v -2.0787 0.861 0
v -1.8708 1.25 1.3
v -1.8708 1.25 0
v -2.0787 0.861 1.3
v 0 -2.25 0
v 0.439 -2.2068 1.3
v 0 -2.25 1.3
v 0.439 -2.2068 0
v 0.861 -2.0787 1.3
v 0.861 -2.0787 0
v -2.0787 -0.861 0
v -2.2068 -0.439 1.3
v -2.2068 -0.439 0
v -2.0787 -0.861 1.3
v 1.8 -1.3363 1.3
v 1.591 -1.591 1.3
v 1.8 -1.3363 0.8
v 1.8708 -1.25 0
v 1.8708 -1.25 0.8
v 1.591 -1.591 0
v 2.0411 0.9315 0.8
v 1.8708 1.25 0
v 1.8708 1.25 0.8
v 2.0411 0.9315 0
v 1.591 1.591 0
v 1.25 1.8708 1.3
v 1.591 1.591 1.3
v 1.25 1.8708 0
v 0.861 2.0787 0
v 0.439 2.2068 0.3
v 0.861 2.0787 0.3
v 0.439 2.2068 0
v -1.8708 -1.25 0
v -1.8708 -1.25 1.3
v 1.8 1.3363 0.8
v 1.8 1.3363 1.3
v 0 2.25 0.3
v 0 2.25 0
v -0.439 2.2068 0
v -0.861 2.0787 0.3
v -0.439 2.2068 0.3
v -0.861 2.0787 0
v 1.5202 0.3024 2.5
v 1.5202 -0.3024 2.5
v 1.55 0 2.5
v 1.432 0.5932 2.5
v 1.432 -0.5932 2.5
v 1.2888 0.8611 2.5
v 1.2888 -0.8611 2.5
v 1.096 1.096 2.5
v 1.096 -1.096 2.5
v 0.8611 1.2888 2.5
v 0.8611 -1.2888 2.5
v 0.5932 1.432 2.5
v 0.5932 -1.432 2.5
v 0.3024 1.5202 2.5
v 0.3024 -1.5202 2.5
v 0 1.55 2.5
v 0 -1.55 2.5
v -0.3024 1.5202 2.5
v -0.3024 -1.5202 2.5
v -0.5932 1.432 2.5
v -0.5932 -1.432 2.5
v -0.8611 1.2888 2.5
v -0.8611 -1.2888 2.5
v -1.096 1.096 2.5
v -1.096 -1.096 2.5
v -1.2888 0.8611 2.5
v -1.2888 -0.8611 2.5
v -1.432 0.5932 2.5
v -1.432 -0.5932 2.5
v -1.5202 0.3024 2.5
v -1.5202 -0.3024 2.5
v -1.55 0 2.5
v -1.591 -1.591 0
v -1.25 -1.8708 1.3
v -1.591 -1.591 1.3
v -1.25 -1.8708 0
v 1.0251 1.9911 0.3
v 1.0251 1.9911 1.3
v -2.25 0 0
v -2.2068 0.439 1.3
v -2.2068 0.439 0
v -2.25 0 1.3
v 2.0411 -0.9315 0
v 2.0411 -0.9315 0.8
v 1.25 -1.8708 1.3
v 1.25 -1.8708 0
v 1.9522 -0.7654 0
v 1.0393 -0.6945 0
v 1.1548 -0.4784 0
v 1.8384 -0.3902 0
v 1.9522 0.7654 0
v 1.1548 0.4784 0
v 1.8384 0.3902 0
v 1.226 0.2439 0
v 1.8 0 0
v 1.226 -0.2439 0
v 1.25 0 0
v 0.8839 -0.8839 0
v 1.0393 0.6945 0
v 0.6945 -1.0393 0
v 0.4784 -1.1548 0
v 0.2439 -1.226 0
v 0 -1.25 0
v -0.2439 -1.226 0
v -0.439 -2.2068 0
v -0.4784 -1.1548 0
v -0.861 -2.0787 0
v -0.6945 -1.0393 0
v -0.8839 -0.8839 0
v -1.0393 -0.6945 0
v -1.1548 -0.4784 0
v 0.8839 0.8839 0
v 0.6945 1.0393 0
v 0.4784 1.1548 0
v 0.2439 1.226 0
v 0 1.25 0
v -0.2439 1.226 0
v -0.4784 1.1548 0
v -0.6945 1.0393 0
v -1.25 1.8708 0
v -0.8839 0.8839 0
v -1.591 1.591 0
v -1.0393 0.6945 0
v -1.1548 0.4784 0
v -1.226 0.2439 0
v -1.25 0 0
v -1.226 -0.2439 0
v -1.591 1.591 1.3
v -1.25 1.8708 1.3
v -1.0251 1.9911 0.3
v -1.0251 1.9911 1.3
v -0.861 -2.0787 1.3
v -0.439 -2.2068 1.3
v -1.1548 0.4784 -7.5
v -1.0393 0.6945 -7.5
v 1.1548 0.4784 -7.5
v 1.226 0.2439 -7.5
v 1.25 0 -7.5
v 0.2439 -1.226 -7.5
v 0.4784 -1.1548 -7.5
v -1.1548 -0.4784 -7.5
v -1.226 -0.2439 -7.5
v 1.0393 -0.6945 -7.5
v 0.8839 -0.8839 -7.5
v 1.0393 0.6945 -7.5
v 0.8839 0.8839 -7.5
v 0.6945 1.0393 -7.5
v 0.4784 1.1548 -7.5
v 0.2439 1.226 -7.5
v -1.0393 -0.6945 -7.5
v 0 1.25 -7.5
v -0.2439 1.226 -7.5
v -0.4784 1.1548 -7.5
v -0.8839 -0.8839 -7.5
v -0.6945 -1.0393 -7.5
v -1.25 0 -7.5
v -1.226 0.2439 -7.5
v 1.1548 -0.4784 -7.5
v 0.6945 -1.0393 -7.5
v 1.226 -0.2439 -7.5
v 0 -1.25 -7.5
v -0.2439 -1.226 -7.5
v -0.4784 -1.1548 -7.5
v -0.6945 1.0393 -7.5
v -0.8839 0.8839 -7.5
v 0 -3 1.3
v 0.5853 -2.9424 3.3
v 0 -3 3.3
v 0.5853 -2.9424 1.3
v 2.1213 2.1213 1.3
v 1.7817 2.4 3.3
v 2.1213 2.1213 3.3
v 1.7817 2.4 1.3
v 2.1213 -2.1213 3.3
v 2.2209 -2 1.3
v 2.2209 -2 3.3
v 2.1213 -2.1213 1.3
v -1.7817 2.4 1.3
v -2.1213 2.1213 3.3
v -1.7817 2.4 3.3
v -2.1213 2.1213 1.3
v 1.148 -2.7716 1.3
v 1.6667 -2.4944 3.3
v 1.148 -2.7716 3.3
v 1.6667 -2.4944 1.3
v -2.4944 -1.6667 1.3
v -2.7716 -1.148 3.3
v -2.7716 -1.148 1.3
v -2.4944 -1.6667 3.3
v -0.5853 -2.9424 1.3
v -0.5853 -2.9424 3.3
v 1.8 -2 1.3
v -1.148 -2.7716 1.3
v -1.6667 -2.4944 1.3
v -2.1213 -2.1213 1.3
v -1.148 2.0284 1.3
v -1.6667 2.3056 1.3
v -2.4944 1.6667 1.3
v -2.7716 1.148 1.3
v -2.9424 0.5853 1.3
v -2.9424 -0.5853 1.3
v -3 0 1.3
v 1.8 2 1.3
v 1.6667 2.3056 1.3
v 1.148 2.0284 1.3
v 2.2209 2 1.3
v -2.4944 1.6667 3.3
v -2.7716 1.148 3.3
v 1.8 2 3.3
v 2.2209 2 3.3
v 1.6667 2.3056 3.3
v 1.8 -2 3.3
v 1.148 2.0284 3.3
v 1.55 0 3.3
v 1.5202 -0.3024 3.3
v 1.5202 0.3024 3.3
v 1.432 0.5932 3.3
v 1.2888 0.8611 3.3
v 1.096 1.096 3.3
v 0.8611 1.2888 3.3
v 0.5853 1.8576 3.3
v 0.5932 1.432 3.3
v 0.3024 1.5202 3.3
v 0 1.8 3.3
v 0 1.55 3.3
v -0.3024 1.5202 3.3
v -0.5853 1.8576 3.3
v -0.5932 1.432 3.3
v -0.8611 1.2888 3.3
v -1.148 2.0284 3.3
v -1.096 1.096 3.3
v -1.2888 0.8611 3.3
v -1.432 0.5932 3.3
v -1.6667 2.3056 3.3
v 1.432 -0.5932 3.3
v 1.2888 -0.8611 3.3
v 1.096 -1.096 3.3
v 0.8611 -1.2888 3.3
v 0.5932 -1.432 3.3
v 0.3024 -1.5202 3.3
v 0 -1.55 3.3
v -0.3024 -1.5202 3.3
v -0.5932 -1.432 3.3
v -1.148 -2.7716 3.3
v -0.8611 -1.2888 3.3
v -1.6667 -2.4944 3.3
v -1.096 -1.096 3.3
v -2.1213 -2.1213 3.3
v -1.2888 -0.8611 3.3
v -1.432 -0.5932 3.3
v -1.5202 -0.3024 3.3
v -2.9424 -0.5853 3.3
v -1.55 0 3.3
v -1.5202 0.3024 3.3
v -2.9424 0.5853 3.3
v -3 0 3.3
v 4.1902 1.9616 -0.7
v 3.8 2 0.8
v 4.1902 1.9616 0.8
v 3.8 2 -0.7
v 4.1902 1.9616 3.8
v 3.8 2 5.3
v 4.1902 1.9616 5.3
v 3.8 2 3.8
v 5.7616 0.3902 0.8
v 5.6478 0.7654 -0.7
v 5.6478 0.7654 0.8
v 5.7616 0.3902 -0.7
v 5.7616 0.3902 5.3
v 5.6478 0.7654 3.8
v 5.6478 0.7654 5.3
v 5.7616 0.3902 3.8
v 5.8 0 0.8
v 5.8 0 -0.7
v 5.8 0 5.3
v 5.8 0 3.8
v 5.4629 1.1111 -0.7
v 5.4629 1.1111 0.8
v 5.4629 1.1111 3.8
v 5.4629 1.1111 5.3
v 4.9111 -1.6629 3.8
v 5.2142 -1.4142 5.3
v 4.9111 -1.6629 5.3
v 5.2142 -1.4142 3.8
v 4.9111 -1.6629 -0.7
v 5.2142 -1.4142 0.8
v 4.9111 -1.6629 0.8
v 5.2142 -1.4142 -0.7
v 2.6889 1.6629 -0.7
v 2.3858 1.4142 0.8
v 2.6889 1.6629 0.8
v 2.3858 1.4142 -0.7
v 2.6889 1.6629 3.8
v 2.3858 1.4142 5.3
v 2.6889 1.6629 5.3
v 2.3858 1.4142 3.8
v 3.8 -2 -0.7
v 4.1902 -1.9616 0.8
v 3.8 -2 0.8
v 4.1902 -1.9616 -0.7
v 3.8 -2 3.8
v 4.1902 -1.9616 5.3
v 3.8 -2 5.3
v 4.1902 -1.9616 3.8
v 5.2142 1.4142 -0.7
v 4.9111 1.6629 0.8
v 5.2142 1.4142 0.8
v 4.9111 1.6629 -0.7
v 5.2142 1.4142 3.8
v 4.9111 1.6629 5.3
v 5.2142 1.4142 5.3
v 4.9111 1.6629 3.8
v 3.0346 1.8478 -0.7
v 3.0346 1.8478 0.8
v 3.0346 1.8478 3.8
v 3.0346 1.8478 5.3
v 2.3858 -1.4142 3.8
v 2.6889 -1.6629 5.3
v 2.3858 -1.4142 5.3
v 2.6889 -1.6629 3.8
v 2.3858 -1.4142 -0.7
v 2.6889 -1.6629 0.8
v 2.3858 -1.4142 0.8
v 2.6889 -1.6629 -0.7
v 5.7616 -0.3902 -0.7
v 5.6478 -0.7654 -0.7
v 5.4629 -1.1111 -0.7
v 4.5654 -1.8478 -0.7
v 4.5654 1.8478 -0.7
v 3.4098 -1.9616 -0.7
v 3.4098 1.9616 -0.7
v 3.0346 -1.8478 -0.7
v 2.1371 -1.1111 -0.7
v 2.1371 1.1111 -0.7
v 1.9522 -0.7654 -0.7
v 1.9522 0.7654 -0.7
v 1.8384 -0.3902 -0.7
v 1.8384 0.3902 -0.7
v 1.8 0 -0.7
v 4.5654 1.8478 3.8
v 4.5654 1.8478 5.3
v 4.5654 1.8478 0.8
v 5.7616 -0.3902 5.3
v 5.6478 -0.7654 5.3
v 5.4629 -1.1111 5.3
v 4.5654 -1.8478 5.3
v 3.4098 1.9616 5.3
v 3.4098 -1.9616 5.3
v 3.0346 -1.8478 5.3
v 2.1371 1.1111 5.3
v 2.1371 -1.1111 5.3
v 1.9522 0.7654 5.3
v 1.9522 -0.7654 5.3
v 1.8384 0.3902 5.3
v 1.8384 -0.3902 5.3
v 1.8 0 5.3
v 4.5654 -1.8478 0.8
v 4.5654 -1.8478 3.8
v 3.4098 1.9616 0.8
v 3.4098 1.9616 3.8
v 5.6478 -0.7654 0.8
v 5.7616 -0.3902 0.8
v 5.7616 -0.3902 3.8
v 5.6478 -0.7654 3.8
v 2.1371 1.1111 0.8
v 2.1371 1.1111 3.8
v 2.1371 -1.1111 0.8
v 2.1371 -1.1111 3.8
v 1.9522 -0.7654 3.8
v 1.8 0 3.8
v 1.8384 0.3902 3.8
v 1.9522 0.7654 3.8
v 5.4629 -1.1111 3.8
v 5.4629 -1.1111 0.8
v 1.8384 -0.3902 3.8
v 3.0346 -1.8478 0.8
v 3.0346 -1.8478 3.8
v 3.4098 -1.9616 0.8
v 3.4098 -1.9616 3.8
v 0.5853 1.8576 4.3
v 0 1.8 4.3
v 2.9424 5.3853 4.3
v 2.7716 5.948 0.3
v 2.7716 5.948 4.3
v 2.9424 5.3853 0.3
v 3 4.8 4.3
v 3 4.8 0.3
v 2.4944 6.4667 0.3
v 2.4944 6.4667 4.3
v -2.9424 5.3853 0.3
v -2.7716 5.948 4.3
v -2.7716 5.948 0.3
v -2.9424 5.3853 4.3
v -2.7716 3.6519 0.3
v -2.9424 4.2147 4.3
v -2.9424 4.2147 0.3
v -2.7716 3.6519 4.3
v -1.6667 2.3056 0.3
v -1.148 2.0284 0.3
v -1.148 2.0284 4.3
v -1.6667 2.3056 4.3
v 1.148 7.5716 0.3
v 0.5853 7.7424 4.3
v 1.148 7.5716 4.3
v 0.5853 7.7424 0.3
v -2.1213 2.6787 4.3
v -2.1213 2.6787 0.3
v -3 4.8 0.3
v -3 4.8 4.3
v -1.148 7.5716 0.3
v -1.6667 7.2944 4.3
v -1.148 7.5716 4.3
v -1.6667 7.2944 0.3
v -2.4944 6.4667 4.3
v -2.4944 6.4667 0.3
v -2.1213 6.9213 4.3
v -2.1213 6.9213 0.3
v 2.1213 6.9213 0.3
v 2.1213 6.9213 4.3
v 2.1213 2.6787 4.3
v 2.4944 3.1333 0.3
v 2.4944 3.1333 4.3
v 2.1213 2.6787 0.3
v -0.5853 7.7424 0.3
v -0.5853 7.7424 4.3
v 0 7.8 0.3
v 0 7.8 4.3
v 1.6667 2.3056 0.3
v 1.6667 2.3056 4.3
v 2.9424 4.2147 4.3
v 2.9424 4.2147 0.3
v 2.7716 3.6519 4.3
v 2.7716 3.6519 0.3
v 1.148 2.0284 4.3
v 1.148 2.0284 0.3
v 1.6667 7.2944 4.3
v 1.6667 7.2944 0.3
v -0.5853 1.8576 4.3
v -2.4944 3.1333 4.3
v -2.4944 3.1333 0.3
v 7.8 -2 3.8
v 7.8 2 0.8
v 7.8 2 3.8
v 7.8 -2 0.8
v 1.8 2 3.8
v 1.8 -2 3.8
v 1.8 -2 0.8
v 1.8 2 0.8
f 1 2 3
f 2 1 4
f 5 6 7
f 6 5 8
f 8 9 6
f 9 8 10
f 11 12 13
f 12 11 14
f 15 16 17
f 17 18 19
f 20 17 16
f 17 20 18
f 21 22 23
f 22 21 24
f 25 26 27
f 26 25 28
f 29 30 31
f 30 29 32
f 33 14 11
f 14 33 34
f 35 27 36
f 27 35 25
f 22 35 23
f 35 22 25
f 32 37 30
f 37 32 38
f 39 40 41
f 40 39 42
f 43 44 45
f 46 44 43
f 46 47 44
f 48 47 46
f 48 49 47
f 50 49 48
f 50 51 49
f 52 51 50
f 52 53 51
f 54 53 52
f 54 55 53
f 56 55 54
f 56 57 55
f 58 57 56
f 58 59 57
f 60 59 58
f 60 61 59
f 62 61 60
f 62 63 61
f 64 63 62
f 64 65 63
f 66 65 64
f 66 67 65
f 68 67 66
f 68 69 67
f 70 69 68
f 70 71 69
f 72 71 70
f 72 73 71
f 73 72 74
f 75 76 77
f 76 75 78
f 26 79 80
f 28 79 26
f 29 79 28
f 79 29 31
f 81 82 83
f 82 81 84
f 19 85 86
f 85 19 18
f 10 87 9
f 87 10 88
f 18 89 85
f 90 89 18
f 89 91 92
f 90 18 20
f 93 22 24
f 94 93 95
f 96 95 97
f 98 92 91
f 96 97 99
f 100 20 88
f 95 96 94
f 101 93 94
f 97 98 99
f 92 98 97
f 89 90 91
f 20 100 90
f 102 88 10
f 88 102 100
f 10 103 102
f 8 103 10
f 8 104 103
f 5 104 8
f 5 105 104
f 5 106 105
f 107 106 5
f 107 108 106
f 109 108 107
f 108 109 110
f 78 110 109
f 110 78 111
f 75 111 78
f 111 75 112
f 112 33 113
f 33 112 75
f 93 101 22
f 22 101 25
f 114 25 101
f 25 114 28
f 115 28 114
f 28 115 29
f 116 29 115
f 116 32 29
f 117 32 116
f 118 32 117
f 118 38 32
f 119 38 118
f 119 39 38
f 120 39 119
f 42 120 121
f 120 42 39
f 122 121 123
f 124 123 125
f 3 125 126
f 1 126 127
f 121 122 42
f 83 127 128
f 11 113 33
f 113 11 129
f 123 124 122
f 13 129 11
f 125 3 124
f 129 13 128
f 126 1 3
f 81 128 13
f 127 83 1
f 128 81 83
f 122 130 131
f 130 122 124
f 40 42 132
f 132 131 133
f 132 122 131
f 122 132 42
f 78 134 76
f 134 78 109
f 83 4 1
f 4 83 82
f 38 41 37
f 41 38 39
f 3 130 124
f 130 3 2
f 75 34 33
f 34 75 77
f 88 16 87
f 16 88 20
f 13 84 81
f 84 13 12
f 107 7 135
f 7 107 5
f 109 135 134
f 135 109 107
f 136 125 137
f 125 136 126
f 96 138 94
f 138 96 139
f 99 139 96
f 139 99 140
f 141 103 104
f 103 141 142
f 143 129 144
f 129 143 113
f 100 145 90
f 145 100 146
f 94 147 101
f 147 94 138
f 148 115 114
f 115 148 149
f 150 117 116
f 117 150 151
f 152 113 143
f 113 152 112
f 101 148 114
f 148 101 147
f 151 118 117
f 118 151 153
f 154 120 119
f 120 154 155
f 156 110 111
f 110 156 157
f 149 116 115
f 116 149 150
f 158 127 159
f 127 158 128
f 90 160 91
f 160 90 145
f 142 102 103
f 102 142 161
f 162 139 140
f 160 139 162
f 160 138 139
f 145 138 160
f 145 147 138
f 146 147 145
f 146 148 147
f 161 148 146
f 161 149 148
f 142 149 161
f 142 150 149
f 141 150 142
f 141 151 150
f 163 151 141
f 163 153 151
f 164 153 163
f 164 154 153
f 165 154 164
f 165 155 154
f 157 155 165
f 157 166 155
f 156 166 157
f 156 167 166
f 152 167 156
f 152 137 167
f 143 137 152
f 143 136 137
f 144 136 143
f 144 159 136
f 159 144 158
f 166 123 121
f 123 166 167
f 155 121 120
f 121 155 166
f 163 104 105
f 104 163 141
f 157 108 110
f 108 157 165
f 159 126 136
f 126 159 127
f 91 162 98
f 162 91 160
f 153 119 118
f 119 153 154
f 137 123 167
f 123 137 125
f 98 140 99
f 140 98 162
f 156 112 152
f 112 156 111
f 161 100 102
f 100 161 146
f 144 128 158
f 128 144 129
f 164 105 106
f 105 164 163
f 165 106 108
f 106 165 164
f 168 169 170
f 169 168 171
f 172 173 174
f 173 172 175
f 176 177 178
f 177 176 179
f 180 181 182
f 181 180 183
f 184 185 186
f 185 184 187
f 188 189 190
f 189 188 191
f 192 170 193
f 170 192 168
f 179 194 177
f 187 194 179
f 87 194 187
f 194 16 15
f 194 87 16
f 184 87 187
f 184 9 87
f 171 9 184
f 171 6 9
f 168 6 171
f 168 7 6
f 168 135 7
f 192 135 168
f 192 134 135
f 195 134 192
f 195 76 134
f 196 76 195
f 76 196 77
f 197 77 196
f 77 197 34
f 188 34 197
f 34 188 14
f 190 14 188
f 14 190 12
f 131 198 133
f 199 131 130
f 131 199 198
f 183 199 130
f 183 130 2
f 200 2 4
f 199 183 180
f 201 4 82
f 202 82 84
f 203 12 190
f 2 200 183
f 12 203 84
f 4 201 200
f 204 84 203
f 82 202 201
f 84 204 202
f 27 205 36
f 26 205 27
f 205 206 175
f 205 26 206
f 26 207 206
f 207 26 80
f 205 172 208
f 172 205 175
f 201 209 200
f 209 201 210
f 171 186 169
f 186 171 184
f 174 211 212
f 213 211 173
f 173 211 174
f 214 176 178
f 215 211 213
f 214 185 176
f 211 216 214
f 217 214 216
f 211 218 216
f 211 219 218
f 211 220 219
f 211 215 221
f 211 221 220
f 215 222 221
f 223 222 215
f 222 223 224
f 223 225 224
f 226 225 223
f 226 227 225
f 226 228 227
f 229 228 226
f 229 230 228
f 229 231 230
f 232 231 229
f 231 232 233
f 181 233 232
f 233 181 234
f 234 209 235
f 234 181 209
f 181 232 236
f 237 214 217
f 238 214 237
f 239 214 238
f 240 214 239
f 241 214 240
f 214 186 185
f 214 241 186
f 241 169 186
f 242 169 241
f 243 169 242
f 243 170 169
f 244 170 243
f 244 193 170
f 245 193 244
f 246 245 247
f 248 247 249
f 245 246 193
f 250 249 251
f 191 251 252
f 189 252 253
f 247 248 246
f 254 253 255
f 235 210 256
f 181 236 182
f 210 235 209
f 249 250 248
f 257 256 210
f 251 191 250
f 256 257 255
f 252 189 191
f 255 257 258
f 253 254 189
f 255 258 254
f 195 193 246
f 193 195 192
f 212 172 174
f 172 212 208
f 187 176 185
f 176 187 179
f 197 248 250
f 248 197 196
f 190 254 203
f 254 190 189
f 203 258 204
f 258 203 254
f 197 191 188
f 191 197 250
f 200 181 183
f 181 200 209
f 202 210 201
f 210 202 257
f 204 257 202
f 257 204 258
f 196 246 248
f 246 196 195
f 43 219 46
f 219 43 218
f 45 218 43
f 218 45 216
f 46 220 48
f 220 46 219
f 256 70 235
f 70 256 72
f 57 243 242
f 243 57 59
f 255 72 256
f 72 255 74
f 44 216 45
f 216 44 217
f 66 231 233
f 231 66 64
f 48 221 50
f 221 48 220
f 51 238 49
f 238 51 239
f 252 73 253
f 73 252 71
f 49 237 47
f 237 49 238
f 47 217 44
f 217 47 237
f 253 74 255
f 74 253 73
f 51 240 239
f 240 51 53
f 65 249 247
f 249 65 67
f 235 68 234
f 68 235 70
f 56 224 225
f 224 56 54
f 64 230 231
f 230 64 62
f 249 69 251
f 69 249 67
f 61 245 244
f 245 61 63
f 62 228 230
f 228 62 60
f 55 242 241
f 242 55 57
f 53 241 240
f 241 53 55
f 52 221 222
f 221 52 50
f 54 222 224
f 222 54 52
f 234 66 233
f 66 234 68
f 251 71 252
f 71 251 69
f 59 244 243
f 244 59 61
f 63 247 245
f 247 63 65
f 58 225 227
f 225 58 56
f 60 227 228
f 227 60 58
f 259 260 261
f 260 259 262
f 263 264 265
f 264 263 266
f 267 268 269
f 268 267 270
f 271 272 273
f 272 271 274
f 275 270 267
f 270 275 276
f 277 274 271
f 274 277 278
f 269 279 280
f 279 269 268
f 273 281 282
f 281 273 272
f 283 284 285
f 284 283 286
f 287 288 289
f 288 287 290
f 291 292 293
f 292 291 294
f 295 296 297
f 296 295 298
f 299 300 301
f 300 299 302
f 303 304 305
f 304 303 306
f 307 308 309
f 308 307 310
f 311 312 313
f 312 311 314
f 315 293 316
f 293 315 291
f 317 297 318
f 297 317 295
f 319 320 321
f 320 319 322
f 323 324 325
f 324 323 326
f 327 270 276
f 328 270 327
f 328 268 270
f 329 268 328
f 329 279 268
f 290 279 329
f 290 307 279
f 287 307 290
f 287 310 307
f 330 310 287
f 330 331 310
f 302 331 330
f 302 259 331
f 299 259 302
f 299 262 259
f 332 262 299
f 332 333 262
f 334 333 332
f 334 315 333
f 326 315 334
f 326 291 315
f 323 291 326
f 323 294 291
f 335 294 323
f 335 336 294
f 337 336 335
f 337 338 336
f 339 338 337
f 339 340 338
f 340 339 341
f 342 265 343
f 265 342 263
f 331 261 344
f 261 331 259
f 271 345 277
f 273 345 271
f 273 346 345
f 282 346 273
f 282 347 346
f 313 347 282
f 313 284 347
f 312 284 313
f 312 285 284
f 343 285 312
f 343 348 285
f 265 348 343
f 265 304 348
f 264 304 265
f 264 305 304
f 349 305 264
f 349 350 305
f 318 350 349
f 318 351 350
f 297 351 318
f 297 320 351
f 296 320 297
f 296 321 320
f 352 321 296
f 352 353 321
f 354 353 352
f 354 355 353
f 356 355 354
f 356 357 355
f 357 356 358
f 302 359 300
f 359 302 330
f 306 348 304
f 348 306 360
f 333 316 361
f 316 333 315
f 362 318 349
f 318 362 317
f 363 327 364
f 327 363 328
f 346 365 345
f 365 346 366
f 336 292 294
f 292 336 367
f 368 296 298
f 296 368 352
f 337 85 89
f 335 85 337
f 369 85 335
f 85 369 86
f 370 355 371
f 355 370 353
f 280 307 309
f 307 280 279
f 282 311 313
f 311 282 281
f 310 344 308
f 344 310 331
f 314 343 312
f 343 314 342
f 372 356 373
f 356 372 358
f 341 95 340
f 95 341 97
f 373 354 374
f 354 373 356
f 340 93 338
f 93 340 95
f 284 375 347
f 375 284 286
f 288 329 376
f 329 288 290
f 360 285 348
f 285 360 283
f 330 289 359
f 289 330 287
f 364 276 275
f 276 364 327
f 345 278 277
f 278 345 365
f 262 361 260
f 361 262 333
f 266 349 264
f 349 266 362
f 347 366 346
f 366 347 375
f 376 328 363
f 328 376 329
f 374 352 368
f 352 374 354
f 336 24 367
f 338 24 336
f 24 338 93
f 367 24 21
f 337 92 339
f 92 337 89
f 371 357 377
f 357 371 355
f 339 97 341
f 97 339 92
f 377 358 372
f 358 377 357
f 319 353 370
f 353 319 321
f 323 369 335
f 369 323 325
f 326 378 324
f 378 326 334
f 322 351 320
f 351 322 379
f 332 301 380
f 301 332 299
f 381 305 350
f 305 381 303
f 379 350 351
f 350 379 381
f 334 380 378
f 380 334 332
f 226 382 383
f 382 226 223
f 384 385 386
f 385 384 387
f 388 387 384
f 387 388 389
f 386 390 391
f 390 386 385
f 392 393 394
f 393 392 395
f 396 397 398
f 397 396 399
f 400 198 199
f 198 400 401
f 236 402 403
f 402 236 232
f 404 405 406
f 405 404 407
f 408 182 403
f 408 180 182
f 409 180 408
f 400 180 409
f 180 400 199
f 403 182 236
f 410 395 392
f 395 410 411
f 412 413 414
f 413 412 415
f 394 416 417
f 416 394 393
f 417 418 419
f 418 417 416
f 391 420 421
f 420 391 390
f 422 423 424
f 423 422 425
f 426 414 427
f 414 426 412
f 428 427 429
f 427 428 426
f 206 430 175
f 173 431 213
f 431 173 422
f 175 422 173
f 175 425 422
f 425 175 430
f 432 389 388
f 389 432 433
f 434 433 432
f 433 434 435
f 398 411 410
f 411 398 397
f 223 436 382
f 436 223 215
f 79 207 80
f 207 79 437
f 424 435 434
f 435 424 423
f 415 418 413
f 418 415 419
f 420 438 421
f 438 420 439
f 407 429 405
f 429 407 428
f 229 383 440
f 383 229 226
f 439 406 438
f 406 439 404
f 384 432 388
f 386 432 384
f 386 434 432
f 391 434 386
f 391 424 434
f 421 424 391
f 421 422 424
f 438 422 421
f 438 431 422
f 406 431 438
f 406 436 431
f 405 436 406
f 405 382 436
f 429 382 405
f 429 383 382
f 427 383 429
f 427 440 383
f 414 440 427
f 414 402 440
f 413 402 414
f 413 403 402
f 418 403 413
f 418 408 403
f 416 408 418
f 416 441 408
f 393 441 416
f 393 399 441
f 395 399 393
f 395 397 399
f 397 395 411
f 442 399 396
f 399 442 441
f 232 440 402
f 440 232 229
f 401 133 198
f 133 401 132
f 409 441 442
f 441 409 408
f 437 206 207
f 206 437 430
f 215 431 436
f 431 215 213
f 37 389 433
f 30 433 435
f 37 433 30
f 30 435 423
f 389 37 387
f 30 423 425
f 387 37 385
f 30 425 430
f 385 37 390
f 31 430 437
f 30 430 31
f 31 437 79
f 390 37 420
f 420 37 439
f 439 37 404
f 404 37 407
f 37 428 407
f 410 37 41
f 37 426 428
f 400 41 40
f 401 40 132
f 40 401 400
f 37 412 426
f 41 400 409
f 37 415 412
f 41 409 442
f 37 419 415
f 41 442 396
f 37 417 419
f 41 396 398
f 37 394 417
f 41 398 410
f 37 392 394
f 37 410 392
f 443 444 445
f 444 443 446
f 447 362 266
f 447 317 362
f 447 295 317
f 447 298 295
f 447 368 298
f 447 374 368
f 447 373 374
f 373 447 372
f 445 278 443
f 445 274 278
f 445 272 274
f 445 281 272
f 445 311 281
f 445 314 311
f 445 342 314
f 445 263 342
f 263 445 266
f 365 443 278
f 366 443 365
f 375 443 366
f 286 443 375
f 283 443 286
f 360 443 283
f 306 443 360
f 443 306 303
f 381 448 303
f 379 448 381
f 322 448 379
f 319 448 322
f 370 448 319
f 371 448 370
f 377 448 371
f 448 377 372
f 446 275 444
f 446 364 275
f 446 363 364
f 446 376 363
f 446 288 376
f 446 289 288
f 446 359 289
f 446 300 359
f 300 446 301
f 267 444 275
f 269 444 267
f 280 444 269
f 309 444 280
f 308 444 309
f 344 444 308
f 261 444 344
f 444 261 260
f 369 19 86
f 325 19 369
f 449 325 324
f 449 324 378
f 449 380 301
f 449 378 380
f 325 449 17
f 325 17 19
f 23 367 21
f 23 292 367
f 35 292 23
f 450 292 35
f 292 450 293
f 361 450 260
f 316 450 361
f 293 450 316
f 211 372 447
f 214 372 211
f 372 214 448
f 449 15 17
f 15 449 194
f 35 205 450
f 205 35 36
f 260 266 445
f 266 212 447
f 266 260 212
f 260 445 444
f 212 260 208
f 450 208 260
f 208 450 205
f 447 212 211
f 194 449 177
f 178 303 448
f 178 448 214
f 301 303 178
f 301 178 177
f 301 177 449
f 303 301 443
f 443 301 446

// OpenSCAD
// Parameters
shaft_diameter_mm = 2.5; //[1.25:5:0.05]
overall_length_mm = 10; //[5:20:0.5]
head_diameter_mm = 4.5; //[3:9:0.1]
head_height_mm = 2.5; //[1.5:5:0.1]
socket_across_flats_mm = 2; //[1.2:3.5:0.05]
socket_depth_mm = 1.5; //[0.8:2.3:0.05]
threaded = 1; //[0:1:1]
thread_pitch_mm = 0.45; //[0.25:0.8:0.01]
thread_depth_mm = 0.12; //[0.05:0.25:0.01]
tip_chamfer_height_mm = 0.4; //[0.1:1:0.05]
overlap_mm = 1.2; //[0.2:2:0.1]   // ensure 1-2mm overlap for connectivity
thread_ridge_count = 12; //[6:30:1]
aux_scale_mm = 1; //[0.5:2:0.1]
washer_outer_diameter_mm = 6; //[4:12:0.1]
washer_thickness_mm = 0.8; //[0.4:2:0.05]

// Derived
shaft_len_mm = overall_length_mm - head_height_mm;
eps = 0.01;

// Pin Socket - Detailed Geometry
module pin_socket() {
  color("DimGray")
    cube([aux_scale_mm*6, aux_scale_mm*4, aux_scale_mm*3], center=true);
}

// Screw and Washer - Detailed Geometry
module screw_and_washer() {
  // Place head so its bottom is at z=0, shaft extends downward (negative z)
  head_center_z = head_height_mm/2;
  shaft_center_z = -(shaft_len_mm/2) + overlap_mm/2; // overlaps into head by overlap_mm/2
  shaft_bottom_z = -shaft_len_mm + overlap_mm/2;

  // Tip chamfer: ensure it overlaps into the shaft by ~overlap_mm
  chamfer_center_z = shaft_bottom_z - tip_chamfer_height_mm/2 + overlap_mm;

  // Small "diamond/triangular" tip piece and FORCE it to intersect the chamfer/shaft
  diamond_h = max(0.6, overlap_mm);
  diamond_r = shaft_diameter_mm/2 * 0.55;
  diamond_center_z = (chamfer_center_z - tip_chamfer_height_mm/2) - diamond_h/2 + overlap_mm;

  union() {
    // Screw (black)
    color("Black") union() {
      // Screw Head
      translate([0, 0, head_center_z])
        cylinder(h=head_height_mm, r=head_diameter_mm/2, center=true, $fn=32);

      // Shaft (overlaps into head)
      translate([0, 0, shaft_center_z])
        cylinder(h=shaft_len_mm + overlap_mm, r=shaft_diameter_mm/2, center=true, $fn=32);

      // Tip Chamfer (overlaps into shaft)
      translate([0, 0, chamfer_center_z])
        cylinder(h=tip_chamfer_height_mm + overlap_mm, r1=shaft_diameter_mm/2, r2=0, center=true, $fn=32);

      // Small diamond/triangular piece below tip (physically attached)
      translate([0, 0, diamond_center_z])
        cylinder(h=diamond_h, r1=diamond_r, r2=0, center=true, $fn=4);
    }

    // Washer (silver) - overlaps into head slightly
    color("Silver")
      difference() {
        translate([0, 0, head_height_mm + washer_thickness_mm/2 - overlap_mm/2])
          cylinder(h=washer_thickness_mm + overlap_mm, r=washer_outer_diameter_mm/2, center=true, $fn=32);
        translate([0, 0, head_height_mm + washer_thickness_mm/2 - overlap_mm/2])
          cylinder(h=washer_thickness_mm + overlap_mm + eps, r=shaft_diameter_mm/2 + overlap_mm/4, center=true, $fn=32);
      }

    // Hex Socket (visual solid as provided)
    color("Black")
      translate([0, 0, head_height_mm - socket_depth_mm/2 - overlap_mm/2])
        cylinder(h=socket_depth_mm + overlap_mm, r=(socket_across_flats_mm/2)/cos(30), center=true, $fn=6);
  }
}

// PCB Spacer - Detailed Geometry (FIXED: attach to washer/head with 1-2mm overlap)
module pcb_spacer() {
  spacer_h = aux_scale_mm*6;
  spacer_r = aux_scale_mm*2;

  // Attach radially to washer OD (or head if washer smaller), with overlap
  attach_r = max(washer_outer_diameter_mm/2, head_diameter_mm/2);
  spacer_center_x = attach_r + spacer_r - overlap_mm; // ensures intersection by overlap_mm

  // Vertically align to washer band so it intersects (not floating)
  washer_center_z = head_height_mm + washer_thickness_mm/2 - overlap_mm/2;
  spacer_center_z = washer_center_z; // guaranteed overlap through full height

  color("Silver")
    translate([spacer_center_x, 0, spacer_center_z])
      cylinder(h=spacer_h, r=spacer_r, center=true, $fn=32);
}

// Buzzer - Detailed Geometry (FIXED: attach to washer/head with 1-2mm overlap)
module buzzer() {
  buzzer_h = aux_scale_mm*4;
  buzzer_r = aux_scale_mm*3;

  // Attach radially to washer OD (or head), with overlap
  attach_r = max(washer_outer_diameter_mm/2, head_diameter_mm/2);
  buzzer_center_y = attach_r + buzzer_r - overlap_mm; // ensures intersection by overlap_mm

  // Vertically align to washer band so it intersects (not floating)
  washer_center_z = head_height_mm + washer_thickness_mm/2 - overlap_mm/2;
  buzzer_center_z = washer_center_z; // guaranteed overlap through full height

  color("Black")
    translate([0, buzzer_center_y, buzzer_center_z])
      cylinder(h=buzzer_h, r=buzzer_r, center=true, $fn=32);
}

// Assembly (single connected union)
module assembly() {
  union() {
    screw_and_washer();
    pcb_spacer();
    buzzer();

    // Pin socket kept, but positioned to intersect the washer/head region (no floating)
    // Attach to +X side of washer with overlap and align Z to washer center.
    pin_x = max(washer_outer_diameter_mm/2, head_diameter_mm/2) + (aux_scale_mm*6)/2 - overlap_mm;
    pin_z = head_height_mm + washer_thickness_mm/2 - overlap_mm/2;
    color("DimGray")
      translate([pin_x, 0, pin_z])
        cube([aux_scale_mm*6, aux_scale_mm*4, aux_scale_mm*3], center=true);
  }
}

assembly();
